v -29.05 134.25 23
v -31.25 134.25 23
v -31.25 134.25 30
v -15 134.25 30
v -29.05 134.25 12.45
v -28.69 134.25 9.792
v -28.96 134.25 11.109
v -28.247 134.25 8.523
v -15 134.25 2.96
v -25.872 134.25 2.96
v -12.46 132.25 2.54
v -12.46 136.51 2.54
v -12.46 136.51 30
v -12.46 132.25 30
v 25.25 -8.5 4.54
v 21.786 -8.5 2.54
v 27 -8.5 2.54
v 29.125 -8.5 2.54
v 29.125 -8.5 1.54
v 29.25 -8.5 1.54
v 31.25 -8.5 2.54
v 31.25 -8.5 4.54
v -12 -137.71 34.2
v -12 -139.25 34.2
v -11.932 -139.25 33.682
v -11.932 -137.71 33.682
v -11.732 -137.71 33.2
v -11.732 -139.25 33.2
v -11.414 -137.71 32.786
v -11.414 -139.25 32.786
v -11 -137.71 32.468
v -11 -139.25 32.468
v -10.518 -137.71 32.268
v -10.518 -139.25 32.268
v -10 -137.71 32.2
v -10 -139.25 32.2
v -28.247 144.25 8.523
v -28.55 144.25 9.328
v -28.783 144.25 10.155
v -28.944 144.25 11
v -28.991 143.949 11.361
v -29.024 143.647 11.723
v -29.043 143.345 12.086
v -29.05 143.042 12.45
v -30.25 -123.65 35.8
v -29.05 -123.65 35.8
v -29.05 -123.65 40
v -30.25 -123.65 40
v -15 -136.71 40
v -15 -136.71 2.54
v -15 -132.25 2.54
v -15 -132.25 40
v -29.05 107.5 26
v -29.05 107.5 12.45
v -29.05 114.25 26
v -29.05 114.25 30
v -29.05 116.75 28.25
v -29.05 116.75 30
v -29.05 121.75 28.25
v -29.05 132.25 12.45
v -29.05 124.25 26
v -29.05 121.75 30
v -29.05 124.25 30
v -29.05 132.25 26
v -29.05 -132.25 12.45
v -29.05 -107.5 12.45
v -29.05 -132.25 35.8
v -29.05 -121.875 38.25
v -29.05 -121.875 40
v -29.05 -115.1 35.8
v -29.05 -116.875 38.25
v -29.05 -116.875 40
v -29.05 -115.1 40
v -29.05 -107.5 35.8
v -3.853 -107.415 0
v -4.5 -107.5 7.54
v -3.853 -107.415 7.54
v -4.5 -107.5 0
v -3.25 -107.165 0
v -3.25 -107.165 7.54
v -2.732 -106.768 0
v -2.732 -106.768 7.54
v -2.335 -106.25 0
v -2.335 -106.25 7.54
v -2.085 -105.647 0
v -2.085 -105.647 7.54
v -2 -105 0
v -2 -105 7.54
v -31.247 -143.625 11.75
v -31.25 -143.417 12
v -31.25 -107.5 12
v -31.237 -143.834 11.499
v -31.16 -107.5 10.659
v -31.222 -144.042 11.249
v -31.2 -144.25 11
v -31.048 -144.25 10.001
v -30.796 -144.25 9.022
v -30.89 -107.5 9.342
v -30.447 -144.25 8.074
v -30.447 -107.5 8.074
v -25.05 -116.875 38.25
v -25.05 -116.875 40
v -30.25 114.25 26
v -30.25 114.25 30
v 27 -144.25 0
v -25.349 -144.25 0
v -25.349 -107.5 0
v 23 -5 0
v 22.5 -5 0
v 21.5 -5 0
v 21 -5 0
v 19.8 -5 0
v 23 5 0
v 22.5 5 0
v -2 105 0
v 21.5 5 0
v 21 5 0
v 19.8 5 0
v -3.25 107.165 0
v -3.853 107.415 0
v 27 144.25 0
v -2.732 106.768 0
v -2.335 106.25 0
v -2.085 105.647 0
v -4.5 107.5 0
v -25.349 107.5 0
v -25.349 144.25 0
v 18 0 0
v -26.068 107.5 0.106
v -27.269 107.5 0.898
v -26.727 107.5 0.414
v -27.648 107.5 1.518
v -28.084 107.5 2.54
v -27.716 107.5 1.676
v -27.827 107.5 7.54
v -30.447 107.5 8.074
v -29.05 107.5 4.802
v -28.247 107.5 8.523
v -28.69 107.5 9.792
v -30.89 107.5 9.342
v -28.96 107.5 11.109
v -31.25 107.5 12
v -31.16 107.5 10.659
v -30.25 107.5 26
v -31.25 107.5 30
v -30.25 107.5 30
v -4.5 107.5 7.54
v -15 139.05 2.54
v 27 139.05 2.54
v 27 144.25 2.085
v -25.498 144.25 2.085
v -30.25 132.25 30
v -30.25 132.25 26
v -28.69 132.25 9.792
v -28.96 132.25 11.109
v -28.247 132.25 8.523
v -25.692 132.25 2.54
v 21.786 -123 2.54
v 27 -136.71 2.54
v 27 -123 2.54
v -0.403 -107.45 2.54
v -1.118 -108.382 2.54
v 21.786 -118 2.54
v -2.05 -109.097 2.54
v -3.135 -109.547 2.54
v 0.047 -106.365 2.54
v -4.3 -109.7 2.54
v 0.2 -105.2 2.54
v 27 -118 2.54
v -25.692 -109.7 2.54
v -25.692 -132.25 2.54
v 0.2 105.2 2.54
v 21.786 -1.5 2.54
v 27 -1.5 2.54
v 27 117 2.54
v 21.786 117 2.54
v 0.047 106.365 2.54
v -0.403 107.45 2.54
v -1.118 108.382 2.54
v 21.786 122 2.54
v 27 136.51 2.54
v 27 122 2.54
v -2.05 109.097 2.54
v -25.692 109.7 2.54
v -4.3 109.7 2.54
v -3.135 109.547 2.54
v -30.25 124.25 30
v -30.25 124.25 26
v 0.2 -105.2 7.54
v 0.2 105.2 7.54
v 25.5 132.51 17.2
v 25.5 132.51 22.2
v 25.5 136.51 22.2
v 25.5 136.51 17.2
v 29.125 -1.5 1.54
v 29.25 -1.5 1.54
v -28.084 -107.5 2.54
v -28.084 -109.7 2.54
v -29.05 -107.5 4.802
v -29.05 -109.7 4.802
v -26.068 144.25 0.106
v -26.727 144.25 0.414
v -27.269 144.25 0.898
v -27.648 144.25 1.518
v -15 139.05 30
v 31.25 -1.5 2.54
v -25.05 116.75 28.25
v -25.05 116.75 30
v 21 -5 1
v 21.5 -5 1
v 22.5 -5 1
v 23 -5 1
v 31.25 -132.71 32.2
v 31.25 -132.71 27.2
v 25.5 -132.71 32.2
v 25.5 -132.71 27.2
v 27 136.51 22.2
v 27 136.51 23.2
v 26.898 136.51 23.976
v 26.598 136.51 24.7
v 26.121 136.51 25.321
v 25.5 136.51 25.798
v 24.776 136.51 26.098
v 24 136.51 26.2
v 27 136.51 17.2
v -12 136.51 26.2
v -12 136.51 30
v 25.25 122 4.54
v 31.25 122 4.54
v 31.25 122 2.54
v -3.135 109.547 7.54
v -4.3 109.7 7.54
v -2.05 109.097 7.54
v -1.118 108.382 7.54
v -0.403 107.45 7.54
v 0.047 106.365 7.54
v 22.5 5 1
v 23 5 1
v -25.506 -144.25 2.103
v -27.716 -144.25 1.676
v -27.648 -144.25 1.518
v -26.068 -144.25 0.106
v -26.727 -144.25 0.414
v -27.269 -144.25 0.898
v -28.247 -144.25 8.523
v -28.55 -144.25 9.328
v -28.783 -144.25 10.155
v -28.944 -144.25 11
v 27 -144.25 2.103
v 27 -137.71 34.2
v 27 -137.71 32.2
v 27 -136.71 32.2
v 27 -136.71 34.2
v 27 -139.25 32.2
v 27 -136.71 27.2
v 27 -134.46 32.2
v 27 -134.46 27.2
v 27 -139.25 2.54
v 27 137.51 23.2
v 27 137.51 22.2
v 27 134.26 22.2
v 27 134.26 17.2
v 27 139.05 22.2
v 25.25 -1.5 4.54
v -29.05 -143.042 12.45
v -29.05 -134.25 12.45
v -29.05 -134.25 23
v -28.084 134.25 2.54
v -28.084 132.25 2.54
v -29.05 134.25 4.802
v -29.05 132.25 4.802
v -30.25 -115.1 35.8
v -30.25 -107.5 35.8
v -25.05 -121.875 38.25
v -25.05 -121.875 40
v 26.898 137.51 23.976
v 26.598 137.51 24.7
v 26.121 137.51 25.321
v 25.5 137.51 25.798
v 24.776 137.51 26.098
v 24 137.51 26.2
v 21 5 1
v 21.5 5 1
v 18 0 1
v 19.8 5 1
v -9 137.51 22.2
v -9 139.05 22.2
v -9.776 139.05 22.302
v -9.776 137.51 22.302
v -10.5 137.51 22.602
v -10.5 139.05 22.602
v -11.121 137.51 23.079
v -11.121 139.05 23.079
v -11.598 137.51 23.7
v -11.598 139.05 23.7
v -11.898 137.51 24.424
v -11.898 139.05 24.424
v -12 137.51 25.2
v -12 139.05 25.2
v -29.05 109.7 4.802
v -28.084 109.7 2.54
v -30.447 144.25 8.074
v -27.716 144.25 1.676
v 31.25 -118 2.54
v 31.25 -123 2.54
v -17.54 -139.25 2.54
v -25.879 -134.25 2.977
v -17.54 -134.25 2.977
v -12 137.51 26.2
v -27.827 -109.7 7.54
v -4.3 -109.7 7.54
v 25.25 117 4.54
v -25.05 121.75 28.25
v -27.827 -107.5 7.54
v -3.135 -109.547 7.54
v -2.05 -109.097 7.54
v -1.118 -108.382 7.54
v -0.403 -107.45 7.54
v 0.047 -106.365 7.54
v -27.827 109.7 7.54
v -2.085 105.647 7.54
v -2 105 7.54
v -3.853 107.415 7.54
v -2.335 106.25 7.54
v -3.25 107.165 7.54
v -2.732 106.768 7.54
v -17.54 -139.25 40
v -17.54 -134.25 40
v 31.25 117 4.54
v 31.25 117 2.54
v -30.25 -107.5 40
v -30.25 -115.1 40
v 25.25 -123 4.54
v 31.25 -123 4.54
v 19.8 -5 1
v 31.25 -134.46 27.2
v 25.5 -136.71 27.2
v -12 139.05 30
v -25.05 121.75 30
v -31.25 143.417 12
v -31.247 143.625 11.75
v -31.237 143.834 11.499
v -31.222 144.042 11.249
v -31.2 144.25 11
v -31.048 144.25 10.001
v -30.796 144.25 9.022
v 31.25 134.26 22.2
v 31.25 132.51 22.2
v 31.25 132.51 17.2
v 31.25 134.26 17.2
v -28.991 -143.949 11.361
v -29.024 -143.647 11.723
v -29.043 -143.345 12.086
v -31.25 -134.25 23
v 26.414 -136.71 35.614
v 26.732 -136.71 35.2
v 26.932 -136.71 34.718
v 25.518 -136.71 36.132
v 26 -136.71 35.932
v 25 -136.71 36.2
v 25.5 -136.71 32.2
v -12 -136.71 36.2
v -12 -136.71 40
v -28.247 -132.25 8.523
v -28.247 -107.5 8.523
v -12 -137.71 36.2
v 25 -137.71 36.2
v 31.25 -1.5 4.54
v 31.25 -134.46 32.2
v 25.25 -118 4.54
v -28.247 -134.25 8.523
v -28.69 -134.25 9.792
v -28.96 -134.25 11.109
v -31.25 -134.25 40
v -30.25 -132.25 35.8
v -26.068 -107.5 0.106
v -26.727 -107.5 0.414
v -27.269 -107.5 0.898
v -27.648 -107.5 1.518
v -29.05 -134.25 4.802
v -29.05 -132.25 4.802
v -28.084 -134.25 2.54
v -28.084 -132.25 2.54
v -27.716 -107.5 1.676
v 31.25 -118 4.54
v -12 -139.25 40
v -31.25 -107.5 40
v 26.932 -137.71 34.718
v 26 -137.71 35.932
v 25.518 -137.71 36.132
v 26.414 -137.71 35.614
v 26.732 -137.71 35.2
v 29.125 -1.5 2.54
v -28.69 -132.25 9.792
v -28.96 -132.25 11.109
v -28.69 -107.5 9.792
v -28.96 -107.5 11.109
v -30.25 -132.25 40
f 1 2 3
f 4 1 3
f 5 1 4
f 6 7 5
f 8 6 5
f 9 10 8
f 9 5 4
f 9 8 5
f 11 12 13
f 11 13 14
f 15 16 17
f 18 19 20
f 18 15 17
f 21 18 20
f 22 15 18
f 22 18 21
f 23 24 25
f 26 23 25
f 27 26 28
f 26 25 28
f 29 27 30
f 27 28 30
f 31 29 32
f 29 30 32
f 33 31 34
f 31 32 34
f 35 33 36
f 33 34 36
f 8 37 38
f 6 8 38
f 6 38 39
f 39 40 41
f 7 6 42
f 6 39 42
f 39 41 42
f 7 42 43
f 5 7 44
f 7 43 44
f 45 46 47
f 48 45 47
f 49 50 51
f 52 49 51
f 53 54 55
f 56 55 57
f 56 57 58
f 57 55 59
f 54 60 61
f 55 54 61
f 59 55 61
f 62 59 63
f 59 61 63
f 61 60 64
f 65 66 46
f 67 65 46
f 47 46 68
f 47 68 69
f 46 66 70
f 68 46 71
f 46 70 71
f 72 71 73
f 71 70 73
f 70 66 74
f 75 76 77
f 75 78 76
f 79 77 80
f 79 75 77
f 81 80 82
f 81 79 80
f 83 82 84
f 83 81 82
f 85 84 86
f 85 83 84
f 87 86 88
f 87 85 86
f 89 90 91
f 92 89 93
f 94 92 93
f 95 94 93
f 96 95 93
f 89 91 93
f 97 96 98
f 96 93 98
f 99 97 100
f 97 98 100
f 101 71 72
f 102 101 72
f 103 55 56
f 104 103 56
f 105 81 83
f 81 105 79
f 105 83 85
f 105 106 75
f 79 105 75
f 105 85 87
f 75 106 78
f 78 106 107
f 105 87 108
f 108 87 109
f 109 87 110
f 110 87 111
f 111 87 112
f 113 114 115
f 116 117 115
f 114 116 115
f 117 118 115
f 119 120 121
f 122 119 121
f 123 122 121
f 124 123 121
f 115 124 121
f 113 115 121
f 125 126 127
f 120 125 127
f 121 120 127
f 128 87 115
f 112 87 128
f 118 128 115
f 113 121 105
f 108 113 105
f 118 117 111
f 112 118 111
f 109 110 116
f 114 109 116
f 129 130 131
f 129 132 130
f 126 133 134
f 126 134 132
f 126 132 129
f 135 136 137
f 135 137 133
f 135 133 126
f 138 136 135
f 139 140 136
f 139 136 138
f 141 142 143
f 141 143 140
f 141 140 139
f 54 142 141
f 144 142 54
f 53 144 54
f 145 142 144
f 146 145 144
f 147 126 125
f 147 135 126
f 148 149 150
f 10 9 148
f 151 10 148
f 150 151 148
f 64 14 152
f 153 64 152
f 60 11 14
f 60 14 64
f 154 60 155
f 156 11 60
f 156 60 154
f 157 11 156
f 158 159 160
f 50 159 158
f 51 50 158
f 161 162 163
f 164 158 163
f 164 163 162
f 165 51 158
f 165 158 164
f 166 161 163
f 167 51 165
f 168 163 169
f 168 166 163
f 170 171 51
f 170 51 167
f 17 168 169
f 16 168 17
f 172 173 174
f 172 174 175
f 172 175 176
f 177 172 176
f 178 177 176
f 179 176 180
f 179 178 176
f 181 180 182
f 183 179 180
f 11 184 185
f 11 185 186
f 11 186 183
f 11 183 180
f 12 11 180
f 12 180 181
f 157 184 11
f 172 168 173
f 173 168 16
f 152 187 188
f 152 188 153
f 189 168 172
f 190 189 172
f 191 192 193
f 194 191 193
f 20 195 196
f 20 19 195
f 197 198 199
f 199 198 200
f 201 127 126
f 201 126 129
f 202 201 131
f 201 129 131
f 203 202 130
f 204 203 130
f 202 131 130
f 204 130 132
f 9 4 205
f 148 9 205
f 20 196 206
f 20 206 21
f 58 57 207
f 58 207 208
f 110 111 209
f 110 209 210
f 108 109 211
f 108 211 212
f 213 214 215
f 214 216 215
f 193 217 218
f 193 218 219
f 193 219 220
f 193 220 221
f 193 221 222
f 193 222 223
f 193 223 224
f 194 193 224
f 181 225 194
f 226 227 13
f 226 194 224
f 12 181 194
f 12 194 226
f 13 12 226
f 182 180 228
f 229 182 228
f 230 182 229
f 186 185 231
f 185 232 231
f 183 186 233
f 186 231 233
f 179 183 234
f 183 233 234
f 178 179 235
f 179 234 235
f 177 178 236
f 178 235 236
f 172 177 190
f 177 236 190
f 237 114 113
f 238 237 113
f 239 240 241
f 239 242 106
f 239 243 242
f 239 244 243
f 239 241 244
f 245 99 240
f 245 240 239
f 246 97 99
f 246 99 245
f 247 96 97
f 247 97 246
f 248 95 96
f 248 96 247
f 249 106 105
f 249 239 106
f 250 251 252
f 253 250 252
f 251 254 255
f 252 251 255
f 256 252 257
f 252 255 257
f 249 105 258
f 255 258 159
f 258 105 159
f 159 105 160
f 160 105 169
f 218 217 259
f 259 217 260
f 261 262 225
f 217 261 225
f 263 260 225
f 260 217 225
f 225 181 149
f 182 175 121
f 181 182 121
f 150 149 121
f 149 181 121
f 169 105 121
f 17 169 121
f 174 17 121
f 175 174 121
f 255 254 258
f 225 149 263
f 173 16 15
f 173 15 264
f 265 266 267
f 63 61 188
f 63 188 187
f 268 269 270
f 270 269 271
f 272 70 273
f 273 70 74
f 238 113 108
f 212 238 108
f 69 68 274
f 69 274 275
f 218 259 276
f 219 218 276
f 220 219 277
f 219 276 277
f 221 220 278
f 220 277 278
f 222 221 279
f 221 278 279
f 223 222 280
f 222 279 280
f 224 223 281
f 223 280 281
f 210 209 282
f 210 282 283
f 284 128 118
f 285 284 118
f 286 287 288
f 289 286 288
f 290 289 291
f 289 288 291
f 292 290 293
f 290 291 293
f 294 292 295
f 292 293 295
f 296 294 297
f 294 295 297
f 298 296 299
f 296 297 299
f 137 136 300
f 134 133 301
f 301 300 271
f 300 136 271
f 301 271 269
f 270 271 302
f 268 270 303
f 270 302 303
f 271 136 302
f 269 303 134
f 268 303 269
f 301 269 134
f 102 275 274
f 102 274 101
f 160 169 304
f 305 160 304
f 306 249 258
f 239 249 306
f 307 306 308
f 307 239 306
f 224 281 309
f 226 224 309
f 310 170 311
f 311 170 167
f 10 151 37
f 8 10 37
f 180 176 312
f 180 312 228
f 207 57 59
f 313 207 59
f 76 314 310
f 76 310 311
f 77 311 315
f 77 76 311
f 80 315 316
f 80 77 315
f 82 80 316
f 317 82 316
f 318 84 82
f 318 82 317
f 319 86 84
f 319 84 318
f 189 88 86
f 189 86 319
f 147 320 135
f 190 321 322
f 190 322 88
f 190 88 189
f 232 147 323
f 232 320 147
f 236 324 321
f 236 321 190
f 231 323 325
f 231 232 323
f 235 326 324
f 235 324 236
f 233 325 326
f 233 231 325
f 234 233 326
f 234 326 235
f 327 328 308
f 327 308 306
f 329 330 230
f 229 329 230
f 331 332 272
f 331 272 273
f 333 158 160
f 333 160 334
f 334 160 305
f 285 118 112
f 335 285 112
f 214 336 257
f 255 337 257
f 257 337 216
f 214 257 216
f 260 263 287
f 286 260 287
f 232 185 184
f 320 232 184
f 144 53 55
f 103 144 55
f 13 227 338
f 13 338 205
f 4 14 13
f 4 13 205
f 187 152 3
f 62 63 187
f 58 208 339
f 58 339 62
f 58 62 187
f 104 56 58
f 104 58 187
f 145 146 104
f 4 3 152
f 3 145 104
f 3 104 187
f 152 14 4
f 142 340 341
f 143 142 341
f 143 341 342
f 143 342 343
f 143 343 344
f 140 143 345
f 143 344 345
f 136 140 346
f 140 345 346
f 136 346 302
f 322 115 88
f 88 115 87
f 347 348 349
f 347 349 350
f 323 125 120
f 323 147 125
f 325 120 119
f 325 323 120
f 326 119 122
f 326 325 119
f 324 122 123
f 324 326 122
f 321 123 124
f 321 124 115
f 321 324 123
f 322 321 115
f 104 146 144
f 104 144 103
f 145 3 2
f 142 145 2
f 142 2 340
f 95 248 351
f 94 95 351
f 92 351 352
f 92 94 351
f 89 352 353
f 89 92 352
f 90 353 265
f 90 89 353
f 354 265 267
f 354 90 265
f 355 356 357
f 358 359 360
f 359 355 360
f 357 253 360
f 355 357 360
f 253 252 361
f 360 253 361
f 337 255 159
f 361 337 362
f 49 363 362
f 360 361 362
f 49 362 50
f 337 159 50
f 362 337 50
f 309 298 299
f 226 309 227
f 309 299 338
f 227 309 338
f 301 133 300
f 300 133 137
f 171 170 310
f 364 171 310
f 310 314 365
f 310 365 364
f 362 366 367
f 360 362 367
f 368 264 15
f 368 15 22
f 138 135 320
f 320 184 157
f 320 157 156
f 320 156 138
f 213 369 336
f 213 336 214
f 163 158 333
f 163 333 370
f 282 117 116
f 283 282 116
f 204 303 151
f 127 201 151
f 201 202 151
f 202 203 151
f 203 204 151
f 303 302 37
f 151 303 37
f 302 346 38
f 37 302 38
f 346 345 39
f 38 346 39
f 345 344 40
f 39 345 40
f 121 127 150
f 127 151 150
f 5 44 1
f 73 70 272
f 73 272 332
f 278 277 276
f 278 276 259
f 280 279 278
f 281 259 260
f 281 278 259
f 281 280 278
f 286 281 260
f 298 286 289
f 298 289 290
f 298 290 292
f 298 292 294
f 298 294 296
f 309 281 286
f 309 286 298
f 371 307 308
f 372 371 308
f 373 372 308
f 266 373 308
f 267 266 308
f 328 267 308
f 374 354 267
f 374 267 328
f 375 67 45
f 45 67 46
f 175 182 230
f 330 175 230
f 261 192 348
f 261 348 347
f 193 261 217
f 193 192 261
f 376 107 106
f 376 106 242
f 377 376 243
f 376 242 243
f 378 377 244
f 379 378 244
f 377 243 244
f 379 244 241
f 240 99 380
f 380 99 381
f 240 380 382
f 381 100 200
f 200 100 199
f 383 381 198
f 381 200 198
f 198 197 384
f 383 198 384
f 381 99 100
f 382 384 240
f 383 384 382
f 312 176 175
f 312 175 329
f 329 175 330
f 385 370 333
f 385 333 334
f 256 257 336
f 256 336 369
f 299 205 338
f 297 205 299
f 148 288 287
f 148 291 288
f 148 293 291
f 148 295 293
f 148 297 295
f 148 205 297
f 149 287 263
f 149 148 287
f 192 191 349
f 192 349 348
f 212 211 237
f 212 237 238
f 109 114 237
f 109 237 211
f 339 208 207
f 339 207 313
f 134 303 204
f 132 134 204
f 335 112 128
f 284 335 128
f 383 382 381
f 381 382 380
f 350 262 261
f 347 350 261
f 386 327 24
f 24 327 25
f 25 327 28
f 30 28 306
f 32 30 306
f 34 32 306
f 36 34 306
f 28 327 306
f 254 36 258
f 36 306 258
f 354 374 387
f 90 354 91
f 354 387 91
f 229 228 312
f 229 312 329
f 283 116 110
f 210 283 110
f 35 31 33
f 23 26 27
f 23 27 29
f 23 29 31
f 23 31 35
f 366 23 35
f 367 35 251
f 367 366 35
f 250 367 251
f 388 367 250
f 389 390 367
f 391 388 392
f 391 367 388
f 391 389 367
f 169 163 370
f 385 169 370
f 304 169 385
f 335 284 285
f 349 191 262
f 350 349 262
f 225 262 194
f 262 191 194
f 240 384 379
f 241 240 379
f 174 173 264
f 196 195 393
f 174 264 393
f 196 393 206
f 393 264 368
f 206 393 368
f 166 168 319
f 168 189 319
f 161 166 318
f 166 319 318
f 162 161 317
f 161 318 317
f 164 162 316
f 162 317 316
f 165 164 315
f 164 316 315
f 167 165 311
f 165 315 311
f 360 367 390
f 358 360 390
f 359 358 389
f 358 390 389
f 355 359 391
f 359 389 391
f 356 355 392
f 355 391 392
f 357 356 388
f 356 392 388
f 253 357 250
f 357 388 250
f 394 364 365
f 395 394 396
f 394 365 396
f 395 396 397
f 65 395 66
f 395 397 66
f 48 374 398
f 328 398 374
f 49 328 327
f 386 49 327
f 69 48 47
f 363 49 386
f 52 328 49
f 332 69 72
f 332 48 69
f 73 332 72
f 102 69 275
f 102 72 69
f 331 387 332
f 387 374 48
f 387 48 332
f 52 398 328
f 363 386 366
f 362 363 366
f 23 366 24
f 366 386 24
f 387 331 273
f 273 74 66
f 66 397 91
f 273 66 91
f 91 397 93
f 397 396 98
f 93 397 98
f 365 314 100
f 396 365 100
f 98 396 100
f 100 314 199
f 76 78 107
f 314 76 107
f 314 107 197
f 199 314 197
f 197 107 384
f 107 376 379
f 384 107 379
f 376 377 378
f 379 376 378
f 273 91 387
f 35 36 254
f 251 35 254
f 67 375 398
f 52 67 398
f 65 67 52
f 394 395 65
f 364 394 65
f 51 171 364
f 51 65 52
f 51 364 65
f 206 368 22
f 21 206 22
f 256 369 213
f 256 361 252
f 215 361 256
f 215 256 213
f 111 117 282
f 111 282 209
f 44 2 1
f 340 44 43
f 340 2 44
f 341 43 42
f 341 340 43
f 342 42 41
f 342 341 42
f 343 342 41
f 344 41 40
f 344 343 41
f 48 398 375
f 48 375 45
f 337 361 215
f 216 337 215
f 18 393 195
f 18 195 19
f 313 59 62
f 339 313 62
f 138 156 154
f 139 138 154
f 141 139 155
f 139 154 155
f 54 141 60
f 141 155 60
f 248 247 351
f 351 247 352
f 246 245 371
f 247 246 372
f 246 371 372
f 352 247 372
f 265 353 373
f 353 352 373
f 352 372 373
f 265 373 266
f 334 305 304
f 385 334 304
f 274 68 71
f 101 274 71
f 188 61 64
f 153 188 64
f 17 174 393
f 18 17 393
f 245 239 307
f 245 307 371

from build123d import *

# Parameters (mm, degrees)
BOSS_EXTRUDE1_DEPTH  = 2.54
BOSS_EXTRUDE2_START  = -288.5
BOSS_EXTRUDE2_DEPTH  = 36.75
BOSS_EXTRUDE3_START  = -36.75
SKETCH4_3_W          = 2.2
SKETCH4_3_H          = 10
BOSS_EXTRUDE3_DEPTH  = 36.75
CUT_EXTRUDE1_DEPTH   = 161.627285976
SKETCH2_W            = 3.357693748
SKETCH2_H            = 2.2
BOSS_EXTRUDE4_DEPTH  = 5
FILLET1_R            = 4.5
FILLET2_R            = 2.5
BOSS_EXTRUDE5_REACH  = 154.276
SKETCH2_3_W          = 3.357693748
SKETCH2_3_H          = 2
BOSS_EXTRUDE6_REACH  = 154.276
CUT_EXTRUDE8_DEPTH   = 293.931412621
FILLET3_R            = 2.5
CUT_EXTRUDE2_DEPTH   = 2.54
CUT_EXTRUDE3_DEPTH   = 1.54
CUT_EXTRUDE4_DEPTH   = 2.54
CUT_EXTRUDE5_DEPTH   = 1.54
SKETCH9_W            = 8.6
SKETCH9_H            = 4.2
SKETCH9_W_2          = 7.6
CUT_EXTRUDE6_DEPTH   = 1.2
SKETCH10_W           = 6.75
SKETCH10_H           = 4
SKETCH10_W_2         = 8
CUT_EXTRUDE7_DEPTH   = 1.2
SKETCH12_W           = 6
SKETCH12_H           = 5
SKETCH12_H_2         = 7
BOSS_EXTRUDE7_DEPTH  = 2
DRAFT1_ANGLE         = 60
SKETCH13_W           = 5
SKETCH13_H           = 1.75
BOSS_EXTRUDE8_DEPTH  = 4
SKETCH14_W           = 4
SKETCH14_H           = 5
BOSS_EXTRUDE9_DEPTH  = 1.5
SKETCH15_W           = 1.75
SKETCH15_H           = 5
BOSS_EXTRUDE10_DEPTH = 4.25
DRAFT2_ANGLE         = 5
DRAFT3_ANGLE         = 5
SKETCH16_W           = 2.125
SKETCH16_H           = 7
BOSS_EXTRUDE11_DEPTH = 1
CHAMFER1_SIZE        = 1
CHAMFER1_SIZE2       = 2
SKETCH17_W           = 0.5
SKETCH17_H           = 10
CUT_EXTRUDE9_DEPTH   = 1


with BuildPart() as part:
    # Sketch1 → Boss-Extrude1 (new body)
    with BuildSketch(Plane(origin=(0, 0, 0), x_dir=(0, 1, 0), z_dir=(0, 0, 1))):
        Polygon((-107.5, 27), (-144.25, 27), (-144.25, -27), (144.25, -27), (144.25, 27), (107.5, 27), (107.5, 2), (-107.5, 2), align=None)
    extrude(amount=BOSS_EXTRUDE1_DEPTH)

    # Sketch4 → Boss-Extrude2 (add)
    with BuildSketch(Plane.XZ.offset(144.25).offset(BOSS_EXTRUDE2_START)):
        with BuildLine():
            Line((-30.446882411, 8.073506155), (-27.715620382, 1.676171354))
            Line((-27.715620382, 1.676171354), (-27, 1.98169652))
            Line((-27, 1.98169652), (-27, 2.54))
            Line((-27, 2.54), (-25.692306252, 2.54))
            Line((-25.692306252, 2.54), (-28.246882411, 8.523489974))
            ThreePointArc((-28.246882411, 8.523489974), (-28.84716347, 10.446090622), (-29.05, 12.449983819))
            Line((-29.05, 12.449983819), (-29.05, 30))
            Line((-29.05, 30), (-31.25, 30))
            Line((-31.25, 30), (-31.25, 12))
            ThreePointArc((-31.25, 12), (-31.04716347, 9.996106803), (-30.446882411, 8.073506155))
        make_face()
        Polygon((-27.715620382, 1.676171354), (-27, 0), (-27, 1.98169652), align=None)
    extrude(amount=BOSS_EXTRUDE2_DEPTH)

    # Sketch4<3> → Boss-Extrude3 (add)
    with BuildSketch(Plane.XZ.offset(144.25).offset(BOSS_EXTRUDE3_START)):
        with BuildLine():
            Line((-30.446882411, 8.073506155), (-27.715620382, 1.676171354))
            Line((-27.715620382, 1.676171354), (-27, 1.98169652))
            Line((-27, 1.98169652), (-27, 2.54))
            Line((-27, 2.54), (-25.692306252, 2.54))
            Line((-25.692306252, 2.54), (-28.246882411, 8.523489974))
            ThreePointArc((-28.246882411, 8.523489974), (-28.84716347, 10.446090622), (-29.05, 12.449983819))
            Line((-29.05, 12.449983819), (-29.05, 30))
            Line((-29.05, 30), (-31.25, 30))
            Line((-31.25, 30), (-31.25, 12))
            ThreePointArc((-31.25, 12), (-31.04716347, 9.996106803), (-30.446882411, 8.073506155))
        make_face()
        with Locations((-30.15, 35)):
            Rectangle(SKETCH4_3_W, SKETCH4_3_H)
        Polygon((-27.715620382, 1.676171354), (-27, 0), (-27, 1.98169652), align=None)
    extrude(amount=BOSS_EXTRUDE3_DEPTH)

    # Sketch5 → Cut-Extrude1 (cut, through all)
    with BuildSketch(Plane(origin=(-31.25, 0, 0), x_dir=(0, -1, 0), z_dir=(-1, 0, 0))):
        Polygon((-134.25, 30), (-134.25, 23), (-144.25, 11), (-144.25, 30), align=None)
        Polygon((144.25, 11), (134.25, 23), (134.25, 40), (144.25, 40), align=None)
    extrude(amount=-CUT_EXTRUDE1_DEPTH, mode=Mode.SUBTRACT)

    # Sketch2 → Boss-Extrude4 (add)
    with BuildSketch(Plane.XY.offset(2.54)):
        Polygon((0.2, 109.7), (-25.692306252, 109.7), (-25.692306252, 107.5), (-2, 107.5), (-2, -107.5), (-25.692306252, -107.5), (-25.692306252, -109.7), (0.2, -109.7), align=None)
        with Locations((-27.371153126, -108.6)):
            Rectangle(SKETCH2_W, SKETCH2_H)
        with Locations((-27.371153126, 108.6)):
            Rectangle(SKETCH2_W, SKETCH2_H)
    extrude(amount=BOSS_EXTRUDE4_DEPTH)

    # Fillet1
    fillet1_edges = [part.edges().sort_by_distance(p)[0] for p in [
        (0.2, 109.7, 5.04),
        (0.2, -109.7, 5.04),
    ]]
    fillet(fillet1_edges, radius=FILLET1_R)

    # Fillet2
    fillet2_edges = [part.edges().sort_by_distance(p)[0] for p in [
        (-2, -107.5, 3.77),
        (-2, 107.5, 3.77),
    ]]
    fillet(fillet2_edges, radius=FILLET2_R)

    # Boss-Extrude5: up to this face of the body (flat: up to its plane)
    boss_extrude5_end = Plane(part.part.faces().sort_by_distance((-30.15, -120.875, 40))[0])
    # Sketch2<3> → Boss-Extrude5 (add, up to the picked face)
    with BuildSketch(Plane.XY.offset(2.54), mode=Mode.PRIVATE) as boss_extrude5_sk1:
        Polygon((27, -139.25), (27, -136.71), (-15, -136.71), (-15, -132.25), (-25.692306252, -132.25), (-25.692306252, -134.25), (-17.54, -134.25), (-17.54, -139.25), align=None)
    boss_extrude5_tool1 = split(extrude(boss_extrude5_sk1.sketch, amount=BOSS_EXTRUDE5_REACH, mode=Mode.PRIVATE), bisect_by=boss_extrude5_end, keep=Keep.BOTH, mode=Mode.PRIVATE)
    # Sketch2<3> → Boss-Extrude5 (add, up to the picked face)
    with BuildSketch(Plane.XY.offset(2.54), mode=Mode.PRIVATE) as boss_extrude5_sk2:
        with Locations((-27.371153126, -133.25)):
            Rectangle(SKETCH2_3_W, SKETCH2_3_H)
    boss_extrude5_tool2 = split(extrude(boss_extrude5_sk2.sketch, amount=BOSS_EXTRUDE5_REACH, mode=Mode.PRIVATE), bisect_by=boss_extrude5_end, keep=Keep.BOTH, mode=Mode.PRIVATE)
    add(boss_extrude5_tool1.solids().sort_by(Axis((-0.011676, -137.150458, 2.54), (0, 0, 1)))[0])
    add(boss_extrude5_tool2.solids().sort_by(Axis((-27.371153, -133.25, 2.54), (0, 0, 1)))[0])

    # Boss-Extrude6: up to this face of the body (flat: up to its plane)
    boss_extrude6_end = Plane(part.part.faces().sort_by_distance((-30.15, 120.875, 30))[0])
    # Sketch2<4> → Boss-Extrude6 (add, up to the picked face)
    with BuildSketch(Plane.XY.offset(2.54), mode=Mode.PRIVATE) as boss_extrude6_sk1:
        Polygon((-29.05, 134.25), (-15, 134.25), (-15, 139.05), (27, 139.05), (27, 136.51), (-12.46, 136.51), (-12.46, 132.25), (-29.05, 132.25), align=None)
    boss_extrude6_tool1 = split(extrude(boss_extrude6_sk1.sketch, amount=BOSS_EXTRUDE6_REACH, mode=Mode.PRIVATE), bisect_by=boss_extrude6_end, keep=Keep.BOTH, mode=Mode.PRIVATE)
    add(boss_extrude6_tool1.solids().sort_by(Axis((-0.874906, 136.653064, 2.54), (0, 0, 1)))[0])

    # Sketch11 → Cut-Extrude8 (cut, through all)
    with BuildSketch(Plane.XZ.offset(144.25)):
        Polygon((-27, 0), (-30.446882411, 8.073506155), (-30.446882411, 0), align=None)
    extrude(amount=-CUT_EXTRUDE8_DEPTH, mode=Mode.SUBTRACT)

    # Fillet3
    fillet3_edges = [part.edges().sort_by_distance(p)[0] for p in [
        (-27, 125.875, 0),
        (-27, -125.875, 0),
    ]]
    fillet(fillet3_edges, radius=FILLET3_R)

    # Sketch7 → Cut-Extrude2 (cut)
    with BuildSketch(Plane.XZ.offset(139.25)):
        with BuildLine():
            ThreePointArc((25, 36.2), (26.414213562, 35.614213562), (27, 34.2))
            Line((27, 34.2), (27, 36.2))
            Line((27, 36.2), (27, 40))
            Line((27, 40), (-12, 40))
            Line((-12, 40), (-12, 36.2))
            Line((-12, 36.2), (25, 36.2))
        make_face()
    extrude(amount=-CUT_EXTRUDE2_DEPTH, mode=Mode.SUBTRACT)

    # Sketch7<3> → Cut-Extrude3 (cut)
    with BuildSketch(Plane.XZ.offset(139.25)):
        with BuildLine():
            Line((-10, 32.2), (27, 32.2))
            Line((27, 32.2), (27, 34.2))
            ThreePointArc((27, 34.2), (26.414213562, 35.614213562), (25, 36.2))
            Line((25, 36.2), (-12, 36.2))
            Line((-12, 36.2), (-12, 34.2))
            ThreePointArc((-12, 34.2), (-11.414213562, 32.785786438), (-10, 32.2))
        make_face()
    extrude(amount=-CUT_EXTRUDE3_DEPTH, mode=Mode.SUBTRACT)

    # Sketch8 → Cut-Extrude4 (cut)
    with BuildSketch(Plane(origin=(0, 139.05, 0), x_dir=(-1, 0, 0), z_dir=(0, 1, 0))):
        with BuildLine():
            Line((12, 26.2), (12, 30))
            Line((12, 30), (-27, 30))
            Line((-27, 30), (-27, 23.2))
            ThreePointArc((-27, 23.2), (-26.121320344, 25.321320344), (-24, 26.2))
            Line((-24, 26.2), (12, 26.2))
        make_face()
    extrude(amount=-CUT_EXTRUDE4_DEPTH, mode=Mode.SUBTRACT)

    # Sketch8<3> → Cut-Extrude5 (cut)
    with BuildSketch(Plane(origin=(0, 139.05, 0), x_dir=(-1, 0, 0), z_dir=(0, 1, 0))):
        with BuildLine():
            Line((12, 25.2), (12, 26.2))
            Line((12, 26.2), (-24, 26.2))
            ThreePointArc((-24, 26.2), (-26.121320344, 25.321320344), (-27, 23.2))
            Line((-27, 23.2), (-27, 22.2))
            Line((-27, 22.2), (9, 22.2))
            ThreePointArc((9, 22.2), (11.121320344, 23.078679656), (12, 25.2))
        make_face()
    extrude(amount=-CUT_EXTRUDE5_DEPTH, mode=Mode.SUBTRACT)

    # Sketch9 → Cut-Extrude6 (cut)
    with BuildSketch(Plane.YZ.offset(-29.05)):
        with Locations((-127.95, 37.9)):
            Rectangle(SKETCH9_W, SKETCH9_H)
        with Locations((-111.3, 37.9)):
            Rectangle(SKETCH9_W_2, SKETCH9_H)
    extrude(amount=-CUT_EXTRUDE6_DEPTH, mode=Mode.SUBTRACT)

    # Sketch10 → Cut-Extrude7 (cut)
    with BuildSketch(Plane.YZ.offset(-29.05)):
        with Locations((110.875, 28)):
            Rectangle(SKETCH10_W, SKETCH10_H)
        with Locations((128.25, 28)):
            Rectangle(SKETCH10_W_2, SKETCH10_H)
    extrude(amount=-CUT_EXTRUDE7_DEPTH, mode=Mode.SUBTRACT)

    # Sketch12 → Boss-Extrude7 (add)
    with BuildSketch(Plane.XY.offset(2.54)):
        with Locations((28.25, -120.5)):
            Rectangle(SKETCH12_W, SKETCH12_H)
        with Locations((28.25, -5)):
            Rectangle(SKETCH12_W, SKETCH12_H_2)
        with Locations((28.25, 119.5)):
            Rectangle(SKETCH12_W, SKETCH12_H)
    extrude(amount=BOSS_EXTRUDE7_DEPTH)

    # Draft1
    draft1_faces = [part.faces().sort_by_distance(p)[0] for p in [
        (25.25, -120.5, 3.54),
        (25.25, -5, 3.54),
        (25.25, 119.5, 3.54),
    ]]
    draft(draft1_faces, Plane.XY.offset(4.54), DRAFT1_ANGLE)

    # Sketch13 → Boss-Extrude8 (add)
    with BuildSketch(Plane.YZ.offset(-29.05)):
        with Locations((-119.375, 39.125)):
            Rectangle(SKETCH13_W, SKETCH13_H)
        with Locations((119.25, 29.125)):
            Rectangle(SKETCH13_W, SKETCH13_H)
    extrude(amount=BOSS_EXTRUDE8_DEPTH)

    # Sketch14 → Boss-Extrude9 (add)
    with BuildSketch(Plane.YZ.offset(25.5)):
        with Locations((134.51, 19.7)):
            Rectangle(SKETCH14_W, SKETCH14_H)
        with Locations((-134.71, 29.7)):
            Rectangle(SKETCH14_W, SKETCH14_H)
    extrude(amount=BOSS_EXTRUDE9_DEPTH)

    # Sketch15 → Boss-Extrude10 (add)
    with BuildSketch(Plane.YZ.offset(27)):
        with Locations((-133.585, 29.7)):
            Rectangle(SKETCH15_W, SKETCH15_H)
        with Locations((133.385, 19.7)):
            Rectangle(SKETCH15_W, SKETCH15_H)
    extrude(amount=BOSS_EXTRUDE10_DEPTH)

    # Draft2
    draft2_faces = [part.faces().sort_by_distance(p)[0] for p in [
        (-2.659119817, 140.861198407, 2.54),
    ]]
    draft(draft2_faces, Plane(origin=(0, 139.05, 86.460982103), x_dir=(0, 0, 1), z_dir=(0, 1, 0)), DRAFT2_ANGLE)

    # Draft3
    draft3_faces = [part.faces().sort_by_distance(p)[0] for p in [
        (-2.330014026, -141.080071643, 2.54),
    ]]
    draft(draft3_faces, Plane(origin=(0, -139.25, 96.485418472), x_dir=(0, 0, -1), z_dir=(0, -1, 0)), DRAFT3_ANGLE)

    # Sketch16 → Boss-Extrude11 (add)
    with BuildSketch(Plane(origin=(0, 0, 2.54), x_dir=(1, 0, 0), z_dir=(0, 0, -1))):
        with Locations((30.1875, 5)):
            Rectangle(SKETCH16_W, SKETCH16_H)
    extrude(amount=BOSS_EXTRUDE11_DEPTH)

    # Chamfer1
    chamfer1_edges = [part.edges().sort_by_distance(p)[0] for p in [
        (31.25, -5, 1.54),
    ]]
    chamfer1_side = [part.faces().sort_by_distance(p)[0] for p in [
        (31.25, -5, 3.04),
    ]]
    chamfer(chamfer1_edges, length=CHAMFER1_SIZE, length2=CHAMFER1_SIZE2, reference=chamfer1_side[0])

    # Sketch17 → Cut-Extrude9 (cut)
    with BuildSketch(Plane(origin=(0, 0, 0), x_dir=(1, 0, 0), z_dir=(0, 0, -1))):
        Polygon((18, 0), (19.8, -5), (19.8, 5), align=None)
        with Locations((21.25, 0)):
            Rectangle(SKETCH17_W, SKETCH17_H)
        with Locations((22.75, 0)):
            Rectangle(SKETCH17_W, SKETCH17_H)
    extrude(amount=-CUT_EXTRUDE9_DEPTH, mode=Mode.SUBTRACT)


solid = part.part
